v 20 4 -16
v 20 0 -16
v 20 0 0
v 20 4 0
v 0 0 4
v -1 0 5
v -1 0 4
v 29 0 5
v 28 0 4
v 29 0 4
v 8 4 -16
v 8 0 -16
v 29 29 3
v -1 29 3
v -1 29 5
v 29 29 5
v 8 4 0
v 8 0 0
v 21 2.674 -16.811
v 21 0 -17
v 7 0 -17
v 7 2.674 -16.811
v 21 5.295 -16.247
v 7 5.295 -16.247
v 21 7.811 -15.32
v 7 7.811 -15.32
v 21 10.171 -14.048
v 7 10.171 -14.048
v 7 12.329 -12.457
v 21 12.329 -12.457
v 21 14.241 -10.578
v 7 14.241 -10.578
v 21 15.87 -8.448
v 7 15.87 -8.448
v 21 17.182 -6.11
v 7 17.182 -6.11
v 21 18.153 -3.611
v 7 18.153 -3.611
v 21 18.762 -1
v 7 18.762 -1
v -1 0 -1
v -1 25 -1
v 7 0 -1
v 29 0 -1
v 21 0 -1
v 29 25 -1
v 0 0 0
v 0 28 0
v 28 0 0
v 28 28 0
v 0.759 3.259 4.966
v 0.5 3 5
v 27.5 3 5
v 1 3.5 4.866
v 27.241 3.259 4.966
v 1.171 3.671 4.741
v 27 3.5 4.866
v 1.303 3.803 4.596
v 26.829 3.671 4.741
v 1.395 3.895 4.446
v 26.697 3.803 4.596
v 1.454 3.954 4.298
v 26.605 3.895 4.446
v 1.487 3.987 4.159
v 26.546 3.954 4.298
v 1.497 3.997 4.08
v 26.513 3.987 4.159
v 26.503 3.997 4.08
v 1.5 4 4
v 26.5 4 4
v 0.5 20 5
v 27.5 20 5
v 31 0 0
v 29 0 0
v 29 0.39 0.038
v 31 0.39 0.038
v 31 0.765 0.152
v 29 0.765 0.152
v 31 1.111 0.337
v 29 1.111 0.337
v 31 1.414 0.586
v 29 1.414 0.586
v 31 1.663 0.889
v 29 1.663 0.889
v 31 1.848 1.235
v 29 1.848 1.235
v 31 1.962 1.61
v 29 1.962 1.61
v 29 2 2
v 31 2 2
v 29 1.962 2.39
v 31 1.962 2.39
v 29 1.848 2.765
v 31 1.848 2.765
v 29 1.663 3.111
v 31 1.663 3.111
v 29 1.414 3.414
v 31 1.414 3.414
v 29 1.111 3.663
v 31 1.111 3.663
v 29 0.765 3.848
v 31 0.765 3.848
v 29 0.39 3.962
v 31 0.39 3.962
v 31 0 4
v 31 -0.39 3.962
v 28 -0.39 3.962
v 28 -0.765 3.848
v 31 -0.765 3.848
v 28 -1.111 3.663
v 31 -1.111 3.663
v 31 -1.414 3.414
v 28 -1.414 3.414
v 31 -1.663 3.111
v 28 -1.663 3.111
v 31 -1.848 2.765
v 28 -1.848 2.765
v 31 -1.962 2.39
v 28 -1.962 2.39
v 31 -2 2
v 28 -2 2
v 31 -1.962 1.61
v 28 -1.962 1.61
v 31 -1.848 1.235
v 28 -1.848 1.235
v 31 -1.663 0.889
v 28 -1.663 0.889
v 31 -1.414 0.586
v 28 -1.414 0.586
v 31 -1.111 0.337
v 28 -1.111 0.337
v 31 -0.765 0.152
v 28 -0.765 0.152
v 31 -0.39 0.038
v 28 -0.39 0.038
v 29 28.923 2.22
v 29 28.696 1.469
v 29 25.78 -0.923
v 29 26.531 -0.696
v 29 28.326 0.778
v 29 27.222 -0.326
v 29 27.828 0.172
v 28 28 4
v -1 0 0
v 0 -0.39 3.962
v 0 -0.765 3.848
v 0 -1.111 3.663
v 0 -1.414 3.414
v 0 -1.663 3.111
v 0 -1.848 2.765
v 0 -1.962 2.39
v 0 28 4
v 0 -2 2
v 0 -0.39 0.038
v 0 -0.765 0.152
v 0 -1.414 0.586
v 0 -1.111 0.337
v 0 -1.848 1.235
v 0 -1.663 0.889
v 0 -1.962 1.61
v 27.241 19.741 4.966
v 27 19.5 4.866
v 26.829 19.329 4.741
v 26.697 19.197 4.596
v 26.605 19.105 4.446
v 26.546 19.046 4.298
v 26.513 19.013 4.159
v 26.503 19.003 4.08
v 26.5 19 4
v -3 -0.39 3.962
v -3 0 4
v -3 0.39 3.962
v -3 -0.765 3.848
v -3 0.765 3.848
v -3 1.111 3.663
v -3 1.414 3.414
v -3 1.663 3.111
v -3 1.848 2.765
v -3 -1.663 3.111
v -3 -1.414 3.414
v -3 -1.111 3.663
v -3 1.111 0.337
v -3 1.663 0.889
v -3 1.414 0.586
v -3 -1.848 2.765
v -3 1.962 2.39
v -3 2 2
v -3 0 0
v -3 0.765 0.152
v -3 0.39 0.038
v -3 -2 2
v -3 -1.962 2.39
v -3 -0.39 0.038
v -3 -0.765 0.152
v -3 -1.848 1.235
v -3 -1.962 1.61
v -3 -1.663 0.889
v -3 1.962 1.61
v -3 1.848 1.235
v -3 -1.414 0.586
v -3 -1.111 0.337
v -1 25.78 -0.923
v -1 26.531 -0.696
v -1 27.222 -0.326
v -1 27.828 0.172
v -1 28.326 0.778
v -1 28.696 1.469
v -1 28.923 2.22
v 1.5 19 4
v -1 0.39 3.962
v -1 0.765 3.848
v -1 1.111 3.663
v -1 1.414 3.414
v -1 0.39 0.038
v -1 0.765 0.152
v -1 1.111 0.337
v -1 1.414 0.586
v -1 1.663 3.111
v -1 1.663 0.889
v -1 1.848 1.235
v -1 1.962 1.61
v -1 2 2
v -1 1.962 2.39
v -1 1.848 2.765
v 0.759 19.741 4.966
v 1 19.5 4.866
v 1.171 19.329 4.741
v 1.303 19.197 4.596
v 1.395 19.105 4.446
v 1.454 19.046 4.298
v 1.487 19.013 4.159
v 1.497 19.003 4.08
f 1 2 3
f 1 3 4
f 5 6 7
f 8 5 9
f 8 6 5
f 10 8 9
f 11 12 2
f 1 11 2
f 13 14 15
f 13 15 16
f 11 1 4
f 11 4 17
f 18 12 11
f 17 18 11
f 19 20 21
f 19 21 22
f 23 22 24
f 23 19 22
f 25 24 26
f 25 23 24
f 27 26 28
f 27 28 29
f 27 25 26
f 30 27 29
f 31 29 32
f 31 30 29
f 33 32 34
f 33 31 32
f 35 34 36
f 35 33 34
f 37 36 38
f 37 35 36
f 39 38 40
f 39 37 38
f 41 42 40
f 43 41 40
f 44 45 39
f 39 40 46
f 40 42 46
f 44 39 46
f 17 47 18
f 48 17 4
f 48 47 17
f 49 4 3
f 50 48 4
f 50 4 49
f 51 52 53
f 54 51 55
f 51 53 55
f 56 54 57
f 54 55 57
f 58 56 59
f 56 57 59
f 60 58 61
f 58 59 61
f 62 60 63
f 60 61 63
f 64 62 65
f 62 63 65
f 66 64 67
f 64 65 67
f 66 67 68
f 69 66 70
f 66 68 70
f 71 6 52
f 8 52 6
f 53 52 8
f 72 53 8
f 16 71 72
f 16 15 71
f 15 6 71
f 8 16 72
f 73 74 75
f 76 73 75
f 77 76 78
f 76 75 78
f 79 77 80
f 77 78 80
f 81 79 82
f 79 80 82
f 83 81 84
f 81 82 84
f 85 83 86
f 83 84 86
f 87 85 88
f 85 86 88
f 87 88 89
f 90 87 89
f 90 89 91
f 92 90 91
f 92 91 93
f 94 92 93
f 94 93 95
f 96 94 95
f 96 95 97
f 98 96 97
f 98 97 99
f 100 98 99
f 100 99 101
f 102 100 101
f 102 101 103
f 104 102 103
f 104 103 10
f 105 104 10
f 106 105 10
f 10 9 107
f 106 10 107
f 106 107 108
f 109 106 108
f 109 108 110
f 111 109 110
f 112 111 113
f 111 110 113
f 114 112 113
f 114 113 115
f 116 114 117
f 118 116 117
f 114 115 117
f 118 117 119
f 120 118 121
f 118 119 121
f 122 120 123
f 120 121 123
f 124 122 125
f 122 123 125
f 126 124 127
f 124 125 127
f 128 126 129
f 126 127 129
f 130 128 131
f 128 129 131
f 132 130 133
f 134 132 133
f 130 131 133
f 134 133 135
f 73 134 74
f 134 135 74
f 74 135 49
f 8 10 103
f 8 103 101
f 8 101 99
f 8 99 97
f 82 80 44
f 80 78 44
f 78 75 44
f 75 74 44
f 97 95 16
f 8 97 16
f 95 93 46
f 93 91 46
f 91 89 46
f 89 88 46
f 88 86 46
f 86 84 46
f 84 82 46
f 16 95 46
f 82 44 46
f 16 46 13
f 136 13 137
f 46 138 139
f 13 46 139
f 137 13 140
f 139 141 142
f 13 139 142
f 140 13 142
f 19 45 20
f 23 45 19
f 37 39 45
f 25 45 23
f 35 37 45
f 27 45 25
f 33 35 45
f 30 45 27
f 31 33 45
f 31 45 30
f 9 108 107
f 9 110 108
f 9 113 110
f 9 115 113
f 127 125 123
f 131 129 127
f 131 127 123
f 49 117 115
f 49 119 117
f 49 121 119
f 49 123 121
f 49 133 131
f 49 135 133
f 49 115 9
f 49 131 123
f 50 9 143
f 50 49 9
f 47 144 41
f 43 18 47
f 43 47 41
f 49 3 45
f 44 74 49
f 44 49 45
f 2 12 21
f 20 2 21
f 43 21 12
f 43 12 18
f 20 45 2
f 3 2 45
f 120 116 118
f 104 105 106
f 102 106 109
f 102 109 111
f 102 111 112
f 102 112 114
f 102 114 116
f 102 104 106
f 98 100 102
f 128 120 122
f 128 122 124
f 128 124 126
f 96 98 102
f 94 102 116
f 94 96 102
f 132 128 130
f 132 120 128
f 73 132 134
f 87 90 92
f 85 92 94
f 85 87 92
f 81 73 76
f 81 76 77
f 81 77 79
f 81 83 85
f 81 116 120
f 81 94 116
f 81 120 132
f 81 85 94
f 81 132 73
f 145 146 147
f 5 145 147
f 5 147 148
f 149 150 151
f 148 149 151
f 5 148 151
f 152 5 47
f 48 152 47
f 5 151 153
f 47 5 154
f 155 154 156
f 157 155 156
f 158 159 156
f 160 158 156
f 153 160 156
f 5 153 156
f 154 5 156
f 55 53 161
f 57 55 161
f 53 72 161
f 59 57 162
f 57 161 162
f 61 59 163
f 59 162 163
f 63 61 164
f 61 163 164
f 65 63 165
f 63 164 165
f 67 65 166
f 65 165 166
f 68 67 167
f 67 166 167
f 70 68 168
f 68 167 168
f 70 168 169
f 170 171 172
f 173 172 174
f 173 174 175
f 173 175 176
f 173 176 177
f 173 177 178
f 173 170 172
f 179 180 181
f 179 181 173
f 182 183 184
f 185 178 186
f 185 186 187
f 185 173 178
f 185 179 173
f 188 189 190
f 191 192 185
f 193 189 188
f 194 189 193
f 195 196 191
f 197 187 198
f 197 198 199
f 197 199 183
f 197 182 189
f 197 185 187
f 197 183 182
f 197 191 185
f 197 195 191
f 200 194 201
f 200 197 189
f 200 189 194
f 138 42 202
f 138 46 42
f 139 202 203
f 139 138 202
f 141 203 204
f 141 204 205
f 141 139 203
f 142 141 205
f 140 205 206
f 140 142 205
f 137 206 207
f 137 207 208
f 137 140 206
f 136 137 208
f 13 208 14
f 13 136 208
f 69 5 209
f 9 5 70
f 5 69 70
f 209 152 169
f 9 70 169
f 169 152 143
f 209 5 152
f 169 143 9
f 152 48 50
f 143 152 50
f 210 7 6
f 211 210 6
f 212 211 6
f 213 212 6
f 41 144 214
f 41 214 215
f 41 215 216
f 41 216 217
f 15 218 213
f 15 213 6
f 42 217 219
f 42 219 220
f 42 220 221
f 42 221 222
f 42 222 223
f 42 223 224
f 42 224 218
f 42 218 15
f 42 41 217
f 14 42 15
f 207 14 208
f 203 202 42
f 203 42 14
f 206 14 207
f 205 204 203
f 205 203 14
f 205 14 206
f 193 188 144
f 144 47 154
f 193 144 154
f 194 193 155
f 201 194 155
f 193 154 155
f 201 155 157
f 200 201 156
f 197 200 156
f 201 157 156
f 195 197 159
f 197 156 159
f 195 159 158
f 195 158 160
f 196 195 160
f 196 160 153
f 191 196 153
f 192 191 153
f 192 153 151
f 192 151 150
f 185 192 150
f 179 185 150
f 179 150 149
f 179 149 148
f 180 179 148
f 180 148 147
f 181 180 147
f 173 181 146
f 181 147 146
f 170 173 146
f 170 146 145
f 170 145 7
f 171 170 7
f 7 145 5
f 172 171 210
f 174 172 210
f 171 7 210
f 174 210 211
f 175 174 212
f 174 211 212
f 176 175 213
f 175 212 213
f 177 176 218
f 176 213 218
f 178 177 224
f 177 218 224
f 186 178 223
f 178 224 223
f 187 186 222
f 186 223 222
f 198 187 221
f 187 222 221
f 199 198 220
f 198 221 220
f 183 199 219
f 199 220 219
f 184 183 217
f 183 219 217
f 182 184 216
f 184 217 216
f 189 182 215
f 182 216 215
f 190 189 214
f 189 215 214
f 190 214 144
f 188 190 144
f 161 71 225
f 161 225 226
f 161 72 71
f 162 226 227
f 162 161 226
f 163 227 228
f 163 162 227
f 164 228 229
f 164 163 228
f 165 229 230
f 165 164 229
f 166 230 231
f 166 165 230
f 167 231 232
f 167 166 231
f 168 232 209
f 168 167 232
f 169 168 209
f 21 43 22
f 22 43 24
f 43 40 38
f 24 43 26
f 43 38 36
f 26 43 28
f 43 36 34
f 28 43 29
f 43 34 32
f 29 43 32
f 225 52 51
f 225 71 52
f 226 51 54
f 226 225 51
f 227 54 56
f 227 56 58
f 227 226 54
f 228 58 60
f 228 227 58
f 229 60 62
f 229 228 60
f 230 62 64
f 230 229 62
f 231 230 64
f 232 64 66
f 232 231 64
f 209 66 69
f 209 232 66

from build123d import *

# Parameters (mm, degrees)
ESQUISSE1_W              = 28
ESQUISSE1_H              = 28
BOSS_EXTRU_1_DEPTH       = 4
COQUE1_T                 = 1
ENL_V_MAT_EXTRU_1_REACH  = 43.449
ESQUISSE2_W              = 25
ESQUISSE2_H              = 15
CONG_1_R                 = 4
CONG_3_R                 = 1
ENL_V_MAT_EXTRU_13_REACH = 43.449
ESQUISSE21_W             = 12
ESQUISSE21_H             = 4
BOSS_EXTRU_8_START       = -15
BOSS_EXTRU_8_DEPTH       = 7
ESQUISSE26_W             = 12
ESQUISSE26_H             = 15
ENL_V_MAT_EXTRU_15_DEPTH = 4
BOSS_EXTRU_9_DEPTH       = 2
BOSS_EXTRU_9_DEPTH_BACK  = 1
ESQUISSE29_R             = 2
BOSS_EXTRU_10_DEPTH      = 2
BOSS_EXTRU_10_DEPTH_BACK = 1
ESQUISSE30_R             = 2


with BuildPart() as part:
    # Esquisse1 → Boss.-Extru.1 (new body)
    with BuildSketch(Plane.XY):
        with Locations((14, 14)):
            Rectangle(ESQUISSE1_W, ESQUISSE1_H)
    extrude(amount=BOSS_EXTRU_1_DEPTH)

    # Coque1
    coque1_openings = [part.faces().sort_by_distance(p)[0] for p in [
        (14, 0, 2),
    ]]
    offset(amount=COQUE1_T, openings=coque1_openings, kind=Kind.INTERSECTION)

    # Esquisse2 → Enlèv. mat.-Extru.1 (cut, up to next)
    with BuildSketch(Plane.XY.offset(5), mode=Mode.PRIVATE) as enl_v_mat_extru_1_sk1:
        with Locations((14, 11.5)):
            Rectangle(ESQUISSE2_W, ESQUISSE2_H)
    enl_v_mat_extru_1_tool1 = extrude(enl_v_mat_extru_1_sk1.sketch, amount=-ENL_V_MAT_EXTRU_1_REACH, mode=Mode.PRIVATE) & part.part
    add(enl_v_mat_extru_1_tool1.solids().sort_by_distance((14, 11.5, 5))[0], mode=Mode.SUBTRACT)

    # Congé1
    cong_1_edges = [part.edges().sort_by_distance(p)[0] for p in [
        (14, 29, -1),
    ]]
    fillet(cong_1_edges, radius=CONG_1_R)

    # Congé3
    cong_3_edges = [part.edges().sort_by_distance(p)[0] for p in [
        (26.5, 11.5, 5),
        (14, 19, 5),
        (1.5, 11.5, 5),
        (14, 4, 5),
    ]]
    fillet(cong_3_edges, radius=CONG_3_R - 0.0001)  # a hair under: the kernel refuses the full size

    # Esquisse21 → Enlèv. mat.-Extru.13 (cut, up to next)
    with BuildSketch(Plane(origin=(0, 0, -1), x_dir=(-1, 0, 0), z_dir=(0, 0, -1)), mode=Mode.PRIVATE) as enl_v_mat_extru_13_sk1:
        with Locations((-14, 2)):
            Rectangle(ESQUISSE21_W, ESQUISSE21_H)
    enl_v_mat_extru_13_tool1 = extrude(enl_v_mat_extru_13_sk1.sketch, amount=-ENL_V_MAT_EXTRU_13_REACH, mode=Mode.PRIVATE) & part.part
    add(enl_v_mat_extru_13_tool1.solids().sort_by_distance((14, 2, -1))[0], mode=Mode.SUBTRACT)

    # Esquisse24 → Boss.-Extru.8 (add, symmetric)
    with BuildSketch(Plane(origin=(29, 0, 0), x_dir=(0, 0, -1), z_dir=(1, 0, 0)).offset(BOSS_EXTRU_8_START)):
        with BuildLine():
            Line((1, 0), (17, 0))
            ThreePointArc((17, 0), (12.456832295, 12.328828006), (1, 18.761663039))
            Line((1, 18.761663039), (1, 0))
        make_face()
    extrude(amount=BOSS_EXTRU_8_DEPTH, both=True)

    # Esquisse26 → Enlèv. mat.-Extru.15 (cut)
    with BuildSketch(Plane.XZ):
        with Locations((14, -8.5)):
            Rectangle(ESQUISSE26_W, ESQUISSE26_H)
    extrude(amount=-ENL_V_MAT_EXTRU_15_DEPTH, mode=Mode.SUBTRACT)

    # Esquisse29 → Boss.-Extru.9 (add, two sides: drawn at the far end of the back side and taken through both)
    with BuildSketch(Plane(origin=(29, 0, 0), x_dir=(0, 0, -1), z_dir=(1, 0, 0)).offset(-BOSS_EXTRU_9_DEPTH_BACK)):
        with Locations((-2, 0)):
            Circle(ESQUISSE29_R)
    extrude(amount=BOSS_EXTRU_9_DEPTH + BOSS_EXTRU_9_DEPTH_BACK)

    # Esquisse30 → Boss.-Extru.10 (add, two sides: drawn at the far end of the back side and taken through both)
    with BuildSketch(Plane.ZY.offset(1).offset(-BOSS_EXTRU_10_DEPTH_BACK)):
        with Locations(Location((2, 0, 0), (0, 0, 180))):
            Circle(ESQUISSE30_R)
    extrude(amount=BOSS_EXTRU_10_DEPTH + BOSS_EXTRU_10_DEPTH_BACK)


solid = part.part
